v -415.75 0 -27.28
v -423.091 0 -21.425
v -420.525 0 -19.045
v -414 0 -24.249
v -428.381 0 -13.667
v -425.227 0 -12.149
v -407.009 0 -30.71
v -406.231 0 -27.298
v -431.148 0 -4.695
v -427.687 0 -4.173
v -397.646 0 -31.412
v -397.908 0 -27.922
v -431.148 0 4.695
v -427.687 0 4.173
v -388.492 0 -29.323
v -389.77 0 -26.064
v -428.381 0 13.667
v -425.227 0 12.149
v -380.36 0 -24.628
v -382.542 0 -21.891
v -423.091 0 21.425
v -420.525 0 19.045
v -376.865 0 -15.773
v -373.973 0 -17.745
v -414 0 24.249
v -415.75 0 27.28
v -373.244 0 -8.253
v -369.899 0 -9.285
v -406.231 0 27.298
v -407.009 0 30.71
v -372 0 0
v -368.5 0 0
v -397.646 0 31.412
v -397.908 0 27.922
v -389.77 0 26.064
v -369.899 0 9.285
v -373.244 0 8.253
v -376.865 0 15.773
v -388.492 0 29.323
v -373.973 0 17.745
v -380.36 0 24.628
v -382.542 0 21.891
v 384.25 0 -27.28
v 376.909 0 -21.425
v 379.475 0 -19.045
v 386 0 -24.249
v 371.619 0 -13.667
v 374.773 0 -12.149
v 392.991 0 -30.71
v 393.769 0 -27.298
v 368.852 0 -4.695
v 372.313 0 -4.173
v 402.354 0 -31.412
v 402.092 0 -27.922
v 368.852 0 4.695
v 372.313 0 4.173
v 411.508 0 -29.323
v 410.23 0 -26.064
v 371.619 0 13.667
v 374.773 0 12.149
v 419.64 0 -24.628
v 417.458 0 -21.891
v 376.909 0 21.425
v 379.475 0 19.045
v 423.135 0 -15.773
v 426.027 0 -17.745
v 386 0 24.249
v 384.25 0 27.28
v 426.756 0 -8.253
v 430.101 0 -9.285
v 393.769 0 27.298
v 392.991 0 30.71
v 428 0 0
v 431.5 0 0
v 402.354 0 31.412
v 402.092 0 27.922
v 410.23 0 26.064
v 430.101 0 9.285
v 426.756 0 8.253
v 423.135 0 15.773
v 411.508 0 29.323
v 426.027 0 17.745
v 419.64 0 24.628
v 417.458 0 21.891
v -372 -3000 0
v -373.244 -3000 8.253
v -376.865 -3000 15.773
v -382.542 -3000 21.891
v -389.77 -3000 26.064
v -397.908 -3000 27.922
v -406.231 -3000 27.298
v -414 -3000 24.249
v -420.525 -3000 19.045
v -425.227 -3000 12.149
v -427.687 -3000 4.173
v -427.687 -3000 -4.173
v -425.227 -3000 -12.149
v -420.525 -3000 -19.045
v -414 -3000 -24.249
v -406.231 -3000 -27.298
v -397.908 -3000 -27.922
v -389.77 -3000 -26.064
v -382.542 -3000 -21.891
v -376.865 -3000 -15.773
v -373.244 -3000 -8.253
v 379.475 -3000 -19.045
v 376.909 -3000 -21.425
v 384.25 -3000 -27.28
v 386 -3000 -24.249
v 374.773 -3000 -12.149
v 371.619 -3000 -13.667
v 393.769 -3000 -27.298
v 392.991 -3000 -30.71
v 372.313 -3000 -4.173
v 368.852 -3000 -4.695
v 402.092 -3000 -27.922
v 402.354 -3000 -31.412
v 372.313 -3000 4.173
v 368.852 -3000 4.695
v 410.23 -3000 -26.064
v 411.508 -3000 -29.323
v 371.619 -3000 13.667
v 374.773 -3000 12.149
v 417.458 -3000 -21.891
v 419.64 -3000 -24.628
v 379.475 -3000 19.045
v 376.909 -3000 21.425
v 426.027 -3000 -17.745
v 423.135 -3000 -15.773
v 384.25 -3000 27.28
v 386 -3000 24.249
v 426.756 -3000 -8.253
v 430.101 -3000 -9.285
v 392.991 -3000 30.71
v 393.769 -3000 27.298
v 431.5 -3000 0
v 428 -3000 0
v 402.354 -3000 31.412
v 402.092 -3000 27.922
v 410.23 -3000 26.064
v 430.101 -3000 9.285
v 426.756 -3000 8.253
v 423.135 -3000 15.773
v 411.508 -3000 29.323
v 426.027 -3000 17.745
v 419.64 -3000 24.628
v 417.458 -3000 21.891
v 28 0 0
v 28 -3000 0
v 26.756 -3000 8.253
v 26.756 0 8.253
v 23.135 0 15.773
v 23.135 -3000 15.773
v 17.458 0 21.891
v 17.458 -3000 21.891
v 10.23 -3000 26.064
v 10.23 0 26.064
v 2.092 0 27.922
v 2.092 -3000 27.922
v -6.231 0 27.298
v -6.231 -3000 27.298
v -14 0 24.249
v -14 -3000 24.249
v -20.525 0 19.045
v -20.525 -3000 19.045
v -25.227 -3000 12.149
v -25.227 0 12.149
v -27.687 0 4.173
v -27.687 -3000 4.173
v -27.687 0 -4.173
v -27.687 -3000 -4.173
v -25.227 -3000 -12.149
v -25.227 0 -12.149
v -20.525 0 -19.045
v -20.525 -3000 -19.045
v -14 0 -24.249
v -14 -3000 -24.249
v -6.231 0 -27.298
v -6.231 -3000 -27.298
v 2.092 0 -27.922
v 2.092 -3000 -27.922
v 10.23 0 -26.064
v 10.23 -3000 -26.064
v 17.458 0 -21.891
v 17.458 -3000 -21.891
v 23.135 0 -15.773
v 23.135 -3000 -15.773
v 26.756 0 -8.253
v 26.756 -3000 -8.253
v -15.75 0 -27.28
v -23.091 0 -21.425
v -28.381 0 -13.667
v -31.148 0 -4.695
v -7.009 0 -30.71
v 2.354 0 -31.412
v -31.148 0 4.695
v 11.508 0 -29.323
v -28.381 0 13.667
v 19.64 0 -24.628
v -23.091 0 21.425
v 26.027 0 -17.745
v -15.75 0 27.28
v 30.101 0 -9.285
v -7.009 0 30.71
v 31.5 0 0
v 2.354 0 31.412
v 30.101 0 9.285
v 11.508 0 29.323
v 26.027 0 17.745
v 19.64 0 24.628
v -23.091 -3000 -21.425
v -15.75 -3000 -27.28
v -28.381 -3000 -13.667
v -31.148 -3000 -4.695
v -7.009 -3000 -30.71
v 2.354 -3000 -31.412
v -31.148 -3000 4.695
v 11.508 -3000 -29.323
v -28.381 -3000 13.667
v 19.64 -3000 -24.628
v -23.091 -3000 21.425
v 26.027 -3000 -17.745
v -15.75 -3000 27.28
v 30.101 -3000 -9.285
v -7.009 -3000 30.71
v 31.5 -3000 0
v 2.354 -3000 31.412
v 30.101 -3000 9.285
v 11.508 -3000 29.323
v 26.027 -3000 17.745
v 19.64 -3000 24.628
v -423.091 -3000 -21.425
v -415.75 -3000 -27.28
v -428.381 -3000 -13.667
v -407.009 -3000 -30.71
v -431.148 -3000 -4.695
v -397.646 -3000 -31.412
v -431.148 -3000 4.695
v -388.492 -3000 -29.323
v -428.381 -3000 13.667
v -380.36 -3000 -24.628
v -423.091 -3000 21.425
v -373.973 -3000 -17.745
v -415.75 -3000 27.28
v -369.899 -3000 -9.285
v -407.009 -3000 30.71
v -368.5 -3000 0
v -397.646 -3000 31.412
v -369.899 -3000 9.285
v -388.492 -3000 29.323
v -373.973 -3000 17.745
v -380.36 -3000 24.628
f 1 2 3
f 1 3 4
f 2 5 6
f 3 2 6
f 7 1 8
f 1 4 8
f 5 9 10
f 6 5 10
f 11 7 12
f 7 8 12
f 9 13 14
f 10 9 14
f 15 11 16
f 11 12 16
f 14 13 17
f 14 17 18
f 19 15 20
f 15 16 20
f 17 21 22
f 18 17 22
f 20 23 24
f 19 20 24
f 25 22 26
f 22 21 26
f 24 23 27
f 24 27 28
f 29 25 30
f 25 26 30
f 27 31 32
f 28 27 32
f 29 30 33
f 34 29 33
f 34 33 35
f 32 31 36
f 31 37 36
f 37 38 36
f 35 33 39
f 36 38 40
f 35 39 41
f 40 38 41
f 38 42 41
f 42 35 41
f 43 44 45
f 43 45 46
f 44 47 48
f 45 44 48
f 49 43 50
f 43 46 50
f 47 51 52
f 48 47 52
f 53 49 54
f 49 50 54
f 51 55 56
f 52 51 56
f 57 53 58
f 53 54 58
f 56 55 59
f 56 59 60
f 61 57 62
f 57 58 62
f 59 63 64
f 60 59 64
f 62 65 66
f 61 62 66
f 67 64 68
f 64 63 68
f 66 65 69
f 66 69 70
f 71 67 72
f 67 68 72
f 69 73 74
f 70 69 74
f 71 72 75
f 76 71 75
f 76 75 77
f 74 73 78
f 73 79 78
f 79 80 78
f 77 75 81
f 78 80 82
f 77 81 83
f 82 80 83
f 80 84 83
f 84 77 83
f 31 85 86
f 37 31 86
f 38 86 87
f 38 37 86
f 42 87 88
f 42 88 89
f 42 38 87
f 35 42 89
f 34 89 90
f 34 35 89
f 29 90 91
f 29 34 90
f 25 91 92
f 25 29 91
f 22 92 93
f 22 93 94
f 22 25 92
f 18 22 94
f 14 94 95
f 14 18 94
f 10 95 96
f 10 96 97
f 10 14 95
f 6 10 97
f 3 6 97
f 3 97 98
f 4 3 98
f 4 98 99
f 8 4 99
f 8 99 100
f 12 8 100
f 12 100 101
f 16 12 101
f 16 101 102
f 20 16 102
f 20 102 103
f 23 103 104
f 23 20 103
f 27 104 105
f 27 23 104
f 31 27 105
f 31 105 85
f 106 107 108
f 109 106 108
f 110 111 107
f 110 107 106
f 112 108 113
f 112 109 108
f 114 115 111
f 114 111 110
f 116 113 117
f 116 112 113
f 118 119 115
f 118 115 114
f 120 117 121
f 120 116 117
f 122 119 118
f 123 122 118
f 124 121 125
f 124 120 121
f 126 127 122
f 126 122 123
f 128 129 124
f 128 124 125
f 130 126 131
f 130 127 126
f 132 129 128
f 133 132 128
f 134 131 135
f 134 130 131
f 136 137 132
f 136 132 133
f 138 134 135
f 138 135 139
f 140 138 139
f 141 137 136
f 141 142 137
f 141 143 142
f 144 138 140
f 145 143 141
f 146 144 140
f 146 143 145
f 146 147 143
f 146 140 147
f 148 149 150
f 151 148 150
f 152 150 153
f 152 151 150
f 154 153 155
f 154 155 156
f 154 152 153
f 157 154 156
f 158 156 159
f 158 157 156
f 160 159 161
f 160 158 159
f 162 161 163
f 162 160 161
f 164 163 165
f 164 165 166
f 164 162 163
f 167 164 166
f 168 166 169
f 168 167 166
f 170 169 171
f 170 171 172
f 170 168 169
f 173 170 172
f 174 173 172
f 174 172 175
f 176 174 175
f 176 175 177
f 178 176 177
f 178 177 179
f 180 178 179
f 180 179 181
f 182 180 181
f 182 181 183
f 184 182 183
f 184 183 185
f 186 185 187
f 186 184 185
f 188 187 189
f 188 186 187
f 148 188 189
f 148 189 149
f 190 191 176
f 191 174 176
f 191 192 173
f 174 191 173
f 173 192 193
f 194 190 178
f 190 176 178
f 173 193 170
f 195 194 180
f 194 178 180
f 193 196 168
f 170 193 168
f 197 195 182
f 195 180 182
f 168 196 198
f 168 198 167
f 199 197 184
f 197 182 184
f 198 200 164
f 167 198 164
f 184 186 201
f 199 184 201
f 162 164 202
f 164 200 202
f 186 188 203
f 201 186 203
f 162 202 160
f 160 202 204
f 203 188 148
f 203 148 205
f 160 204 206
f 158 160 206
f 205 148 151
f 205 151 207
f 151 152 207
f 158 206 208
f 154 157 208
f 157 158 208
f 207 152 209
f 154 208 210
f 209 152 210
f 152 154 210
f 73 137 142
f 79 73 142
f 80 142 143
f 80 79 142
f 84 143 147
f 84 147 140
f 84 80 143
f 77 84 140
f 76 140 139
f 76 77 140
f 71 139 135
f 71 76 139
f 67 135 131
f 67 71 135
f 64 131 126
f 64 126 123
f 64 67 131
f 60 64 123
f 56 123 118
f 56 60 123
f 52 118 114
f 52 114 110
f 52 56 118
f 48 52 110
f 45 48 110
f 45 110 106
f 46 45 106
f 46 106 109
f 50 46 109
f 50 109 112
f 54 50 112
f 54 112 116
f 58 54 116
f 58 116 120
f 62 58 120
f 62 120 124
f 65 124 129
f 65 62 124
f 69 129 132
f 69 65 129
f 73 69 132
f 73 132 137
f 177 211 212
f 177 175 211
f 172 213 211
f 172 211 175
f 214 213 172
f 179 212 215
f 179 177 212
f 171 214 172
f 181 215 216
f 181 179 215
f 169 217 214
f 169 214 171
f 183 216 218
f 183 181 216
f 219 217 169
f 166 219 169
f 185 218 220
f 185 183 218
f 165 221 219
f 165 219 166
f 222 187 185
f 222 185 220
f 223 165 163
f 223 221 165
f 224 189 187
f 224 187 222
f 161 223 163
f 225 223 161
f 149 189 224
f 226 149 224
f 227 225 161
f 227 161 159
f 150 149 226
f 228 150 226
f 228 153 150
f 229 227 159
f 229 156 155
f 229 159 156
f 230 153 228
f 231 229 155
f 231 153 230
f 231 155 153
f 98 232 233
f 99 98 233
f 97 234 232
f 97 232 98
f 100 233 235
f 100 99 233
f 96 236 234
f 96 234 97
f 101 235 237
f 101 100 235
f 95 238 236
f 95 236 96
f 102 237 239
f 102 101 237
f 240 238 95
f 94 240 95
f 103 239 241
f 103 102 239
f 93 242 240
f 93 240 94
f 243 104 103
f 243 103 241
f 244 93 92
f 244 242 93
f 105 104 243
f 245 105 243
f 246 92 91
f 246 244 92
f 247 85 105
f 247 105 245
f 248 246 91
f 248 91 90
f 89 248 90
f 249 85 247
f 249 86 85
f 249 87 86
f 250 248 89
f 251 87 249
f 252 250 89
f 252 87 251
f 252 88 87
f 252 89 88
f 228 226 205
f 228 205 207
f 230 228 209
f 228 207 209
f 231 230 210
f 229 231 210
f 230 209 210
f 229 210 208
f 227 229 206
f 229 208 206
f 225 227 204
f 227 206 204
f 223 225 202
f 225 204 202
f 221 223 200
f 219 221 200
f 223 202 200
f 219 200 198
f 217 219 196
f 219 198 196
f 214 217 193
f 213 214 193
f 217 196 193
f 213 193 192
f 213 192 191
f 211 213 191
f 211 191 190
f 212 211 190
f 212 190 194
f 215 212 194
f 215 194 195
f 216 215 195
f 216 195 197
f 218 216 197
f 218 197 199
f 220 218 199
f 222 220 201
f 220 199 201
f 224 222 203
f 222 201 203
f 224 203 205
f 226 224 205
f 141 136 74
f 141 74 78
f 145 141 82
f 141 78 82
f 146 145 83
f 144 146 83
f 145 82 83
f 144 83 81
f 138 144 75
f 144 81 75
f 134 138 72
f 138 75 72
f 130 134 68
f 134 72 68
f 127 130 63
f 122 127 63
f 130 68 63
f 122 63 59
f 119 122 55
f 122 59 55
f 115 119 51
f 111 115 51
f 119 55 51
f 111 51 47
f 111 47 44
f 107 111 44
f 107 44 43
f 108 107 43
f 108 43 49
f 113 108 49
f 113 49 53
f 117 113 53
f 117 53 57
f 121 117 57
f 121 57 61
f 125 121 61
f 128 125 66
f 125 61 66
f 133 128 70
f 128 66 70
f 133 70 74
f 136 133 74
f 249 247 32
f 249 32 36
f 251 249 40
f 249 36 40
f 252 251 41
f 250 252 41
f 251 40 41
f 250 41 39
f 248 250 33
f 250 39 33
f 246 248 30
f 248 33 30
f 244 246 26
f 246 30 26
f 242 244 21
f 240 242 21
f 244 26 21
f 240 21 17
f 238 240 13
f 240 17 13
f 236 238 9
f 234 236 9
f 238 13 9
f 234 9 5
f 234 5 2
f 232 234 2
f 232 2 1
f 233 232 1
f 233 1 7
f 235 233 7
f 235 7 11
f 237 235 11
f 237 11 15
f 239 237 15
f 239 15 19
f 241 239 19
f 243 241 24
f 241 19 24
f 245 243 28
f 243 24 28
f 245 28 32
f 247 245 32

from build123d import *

# Parameters (mm, degrees)
F0_R     = 31.5
F0_R_2   = 28
F1_DEPTH = 3000


with BuildPart() as f1:
    # F0 (on Front) → F1 (new body)
    with BuildSketch(Plane.XZ):
        with Locations((-400, 0)):
            Circle(F0_R)
        with Locations((-400, 0)):
            Circle(F0_R_2, mode=Mode.SUBTRACT)
        Circle(F0_R)
        Circle(F0_R_2, mode=Mode.SUBTRACT)
        with Locations((400, 0)):
            Circle(F0_R)
        with Locations((400, 0)):
            Circle(F0_R_2, mode=Mode.SUBTRACT)
    extrude(amount=F1_DEPTH)


solid = f1.part
